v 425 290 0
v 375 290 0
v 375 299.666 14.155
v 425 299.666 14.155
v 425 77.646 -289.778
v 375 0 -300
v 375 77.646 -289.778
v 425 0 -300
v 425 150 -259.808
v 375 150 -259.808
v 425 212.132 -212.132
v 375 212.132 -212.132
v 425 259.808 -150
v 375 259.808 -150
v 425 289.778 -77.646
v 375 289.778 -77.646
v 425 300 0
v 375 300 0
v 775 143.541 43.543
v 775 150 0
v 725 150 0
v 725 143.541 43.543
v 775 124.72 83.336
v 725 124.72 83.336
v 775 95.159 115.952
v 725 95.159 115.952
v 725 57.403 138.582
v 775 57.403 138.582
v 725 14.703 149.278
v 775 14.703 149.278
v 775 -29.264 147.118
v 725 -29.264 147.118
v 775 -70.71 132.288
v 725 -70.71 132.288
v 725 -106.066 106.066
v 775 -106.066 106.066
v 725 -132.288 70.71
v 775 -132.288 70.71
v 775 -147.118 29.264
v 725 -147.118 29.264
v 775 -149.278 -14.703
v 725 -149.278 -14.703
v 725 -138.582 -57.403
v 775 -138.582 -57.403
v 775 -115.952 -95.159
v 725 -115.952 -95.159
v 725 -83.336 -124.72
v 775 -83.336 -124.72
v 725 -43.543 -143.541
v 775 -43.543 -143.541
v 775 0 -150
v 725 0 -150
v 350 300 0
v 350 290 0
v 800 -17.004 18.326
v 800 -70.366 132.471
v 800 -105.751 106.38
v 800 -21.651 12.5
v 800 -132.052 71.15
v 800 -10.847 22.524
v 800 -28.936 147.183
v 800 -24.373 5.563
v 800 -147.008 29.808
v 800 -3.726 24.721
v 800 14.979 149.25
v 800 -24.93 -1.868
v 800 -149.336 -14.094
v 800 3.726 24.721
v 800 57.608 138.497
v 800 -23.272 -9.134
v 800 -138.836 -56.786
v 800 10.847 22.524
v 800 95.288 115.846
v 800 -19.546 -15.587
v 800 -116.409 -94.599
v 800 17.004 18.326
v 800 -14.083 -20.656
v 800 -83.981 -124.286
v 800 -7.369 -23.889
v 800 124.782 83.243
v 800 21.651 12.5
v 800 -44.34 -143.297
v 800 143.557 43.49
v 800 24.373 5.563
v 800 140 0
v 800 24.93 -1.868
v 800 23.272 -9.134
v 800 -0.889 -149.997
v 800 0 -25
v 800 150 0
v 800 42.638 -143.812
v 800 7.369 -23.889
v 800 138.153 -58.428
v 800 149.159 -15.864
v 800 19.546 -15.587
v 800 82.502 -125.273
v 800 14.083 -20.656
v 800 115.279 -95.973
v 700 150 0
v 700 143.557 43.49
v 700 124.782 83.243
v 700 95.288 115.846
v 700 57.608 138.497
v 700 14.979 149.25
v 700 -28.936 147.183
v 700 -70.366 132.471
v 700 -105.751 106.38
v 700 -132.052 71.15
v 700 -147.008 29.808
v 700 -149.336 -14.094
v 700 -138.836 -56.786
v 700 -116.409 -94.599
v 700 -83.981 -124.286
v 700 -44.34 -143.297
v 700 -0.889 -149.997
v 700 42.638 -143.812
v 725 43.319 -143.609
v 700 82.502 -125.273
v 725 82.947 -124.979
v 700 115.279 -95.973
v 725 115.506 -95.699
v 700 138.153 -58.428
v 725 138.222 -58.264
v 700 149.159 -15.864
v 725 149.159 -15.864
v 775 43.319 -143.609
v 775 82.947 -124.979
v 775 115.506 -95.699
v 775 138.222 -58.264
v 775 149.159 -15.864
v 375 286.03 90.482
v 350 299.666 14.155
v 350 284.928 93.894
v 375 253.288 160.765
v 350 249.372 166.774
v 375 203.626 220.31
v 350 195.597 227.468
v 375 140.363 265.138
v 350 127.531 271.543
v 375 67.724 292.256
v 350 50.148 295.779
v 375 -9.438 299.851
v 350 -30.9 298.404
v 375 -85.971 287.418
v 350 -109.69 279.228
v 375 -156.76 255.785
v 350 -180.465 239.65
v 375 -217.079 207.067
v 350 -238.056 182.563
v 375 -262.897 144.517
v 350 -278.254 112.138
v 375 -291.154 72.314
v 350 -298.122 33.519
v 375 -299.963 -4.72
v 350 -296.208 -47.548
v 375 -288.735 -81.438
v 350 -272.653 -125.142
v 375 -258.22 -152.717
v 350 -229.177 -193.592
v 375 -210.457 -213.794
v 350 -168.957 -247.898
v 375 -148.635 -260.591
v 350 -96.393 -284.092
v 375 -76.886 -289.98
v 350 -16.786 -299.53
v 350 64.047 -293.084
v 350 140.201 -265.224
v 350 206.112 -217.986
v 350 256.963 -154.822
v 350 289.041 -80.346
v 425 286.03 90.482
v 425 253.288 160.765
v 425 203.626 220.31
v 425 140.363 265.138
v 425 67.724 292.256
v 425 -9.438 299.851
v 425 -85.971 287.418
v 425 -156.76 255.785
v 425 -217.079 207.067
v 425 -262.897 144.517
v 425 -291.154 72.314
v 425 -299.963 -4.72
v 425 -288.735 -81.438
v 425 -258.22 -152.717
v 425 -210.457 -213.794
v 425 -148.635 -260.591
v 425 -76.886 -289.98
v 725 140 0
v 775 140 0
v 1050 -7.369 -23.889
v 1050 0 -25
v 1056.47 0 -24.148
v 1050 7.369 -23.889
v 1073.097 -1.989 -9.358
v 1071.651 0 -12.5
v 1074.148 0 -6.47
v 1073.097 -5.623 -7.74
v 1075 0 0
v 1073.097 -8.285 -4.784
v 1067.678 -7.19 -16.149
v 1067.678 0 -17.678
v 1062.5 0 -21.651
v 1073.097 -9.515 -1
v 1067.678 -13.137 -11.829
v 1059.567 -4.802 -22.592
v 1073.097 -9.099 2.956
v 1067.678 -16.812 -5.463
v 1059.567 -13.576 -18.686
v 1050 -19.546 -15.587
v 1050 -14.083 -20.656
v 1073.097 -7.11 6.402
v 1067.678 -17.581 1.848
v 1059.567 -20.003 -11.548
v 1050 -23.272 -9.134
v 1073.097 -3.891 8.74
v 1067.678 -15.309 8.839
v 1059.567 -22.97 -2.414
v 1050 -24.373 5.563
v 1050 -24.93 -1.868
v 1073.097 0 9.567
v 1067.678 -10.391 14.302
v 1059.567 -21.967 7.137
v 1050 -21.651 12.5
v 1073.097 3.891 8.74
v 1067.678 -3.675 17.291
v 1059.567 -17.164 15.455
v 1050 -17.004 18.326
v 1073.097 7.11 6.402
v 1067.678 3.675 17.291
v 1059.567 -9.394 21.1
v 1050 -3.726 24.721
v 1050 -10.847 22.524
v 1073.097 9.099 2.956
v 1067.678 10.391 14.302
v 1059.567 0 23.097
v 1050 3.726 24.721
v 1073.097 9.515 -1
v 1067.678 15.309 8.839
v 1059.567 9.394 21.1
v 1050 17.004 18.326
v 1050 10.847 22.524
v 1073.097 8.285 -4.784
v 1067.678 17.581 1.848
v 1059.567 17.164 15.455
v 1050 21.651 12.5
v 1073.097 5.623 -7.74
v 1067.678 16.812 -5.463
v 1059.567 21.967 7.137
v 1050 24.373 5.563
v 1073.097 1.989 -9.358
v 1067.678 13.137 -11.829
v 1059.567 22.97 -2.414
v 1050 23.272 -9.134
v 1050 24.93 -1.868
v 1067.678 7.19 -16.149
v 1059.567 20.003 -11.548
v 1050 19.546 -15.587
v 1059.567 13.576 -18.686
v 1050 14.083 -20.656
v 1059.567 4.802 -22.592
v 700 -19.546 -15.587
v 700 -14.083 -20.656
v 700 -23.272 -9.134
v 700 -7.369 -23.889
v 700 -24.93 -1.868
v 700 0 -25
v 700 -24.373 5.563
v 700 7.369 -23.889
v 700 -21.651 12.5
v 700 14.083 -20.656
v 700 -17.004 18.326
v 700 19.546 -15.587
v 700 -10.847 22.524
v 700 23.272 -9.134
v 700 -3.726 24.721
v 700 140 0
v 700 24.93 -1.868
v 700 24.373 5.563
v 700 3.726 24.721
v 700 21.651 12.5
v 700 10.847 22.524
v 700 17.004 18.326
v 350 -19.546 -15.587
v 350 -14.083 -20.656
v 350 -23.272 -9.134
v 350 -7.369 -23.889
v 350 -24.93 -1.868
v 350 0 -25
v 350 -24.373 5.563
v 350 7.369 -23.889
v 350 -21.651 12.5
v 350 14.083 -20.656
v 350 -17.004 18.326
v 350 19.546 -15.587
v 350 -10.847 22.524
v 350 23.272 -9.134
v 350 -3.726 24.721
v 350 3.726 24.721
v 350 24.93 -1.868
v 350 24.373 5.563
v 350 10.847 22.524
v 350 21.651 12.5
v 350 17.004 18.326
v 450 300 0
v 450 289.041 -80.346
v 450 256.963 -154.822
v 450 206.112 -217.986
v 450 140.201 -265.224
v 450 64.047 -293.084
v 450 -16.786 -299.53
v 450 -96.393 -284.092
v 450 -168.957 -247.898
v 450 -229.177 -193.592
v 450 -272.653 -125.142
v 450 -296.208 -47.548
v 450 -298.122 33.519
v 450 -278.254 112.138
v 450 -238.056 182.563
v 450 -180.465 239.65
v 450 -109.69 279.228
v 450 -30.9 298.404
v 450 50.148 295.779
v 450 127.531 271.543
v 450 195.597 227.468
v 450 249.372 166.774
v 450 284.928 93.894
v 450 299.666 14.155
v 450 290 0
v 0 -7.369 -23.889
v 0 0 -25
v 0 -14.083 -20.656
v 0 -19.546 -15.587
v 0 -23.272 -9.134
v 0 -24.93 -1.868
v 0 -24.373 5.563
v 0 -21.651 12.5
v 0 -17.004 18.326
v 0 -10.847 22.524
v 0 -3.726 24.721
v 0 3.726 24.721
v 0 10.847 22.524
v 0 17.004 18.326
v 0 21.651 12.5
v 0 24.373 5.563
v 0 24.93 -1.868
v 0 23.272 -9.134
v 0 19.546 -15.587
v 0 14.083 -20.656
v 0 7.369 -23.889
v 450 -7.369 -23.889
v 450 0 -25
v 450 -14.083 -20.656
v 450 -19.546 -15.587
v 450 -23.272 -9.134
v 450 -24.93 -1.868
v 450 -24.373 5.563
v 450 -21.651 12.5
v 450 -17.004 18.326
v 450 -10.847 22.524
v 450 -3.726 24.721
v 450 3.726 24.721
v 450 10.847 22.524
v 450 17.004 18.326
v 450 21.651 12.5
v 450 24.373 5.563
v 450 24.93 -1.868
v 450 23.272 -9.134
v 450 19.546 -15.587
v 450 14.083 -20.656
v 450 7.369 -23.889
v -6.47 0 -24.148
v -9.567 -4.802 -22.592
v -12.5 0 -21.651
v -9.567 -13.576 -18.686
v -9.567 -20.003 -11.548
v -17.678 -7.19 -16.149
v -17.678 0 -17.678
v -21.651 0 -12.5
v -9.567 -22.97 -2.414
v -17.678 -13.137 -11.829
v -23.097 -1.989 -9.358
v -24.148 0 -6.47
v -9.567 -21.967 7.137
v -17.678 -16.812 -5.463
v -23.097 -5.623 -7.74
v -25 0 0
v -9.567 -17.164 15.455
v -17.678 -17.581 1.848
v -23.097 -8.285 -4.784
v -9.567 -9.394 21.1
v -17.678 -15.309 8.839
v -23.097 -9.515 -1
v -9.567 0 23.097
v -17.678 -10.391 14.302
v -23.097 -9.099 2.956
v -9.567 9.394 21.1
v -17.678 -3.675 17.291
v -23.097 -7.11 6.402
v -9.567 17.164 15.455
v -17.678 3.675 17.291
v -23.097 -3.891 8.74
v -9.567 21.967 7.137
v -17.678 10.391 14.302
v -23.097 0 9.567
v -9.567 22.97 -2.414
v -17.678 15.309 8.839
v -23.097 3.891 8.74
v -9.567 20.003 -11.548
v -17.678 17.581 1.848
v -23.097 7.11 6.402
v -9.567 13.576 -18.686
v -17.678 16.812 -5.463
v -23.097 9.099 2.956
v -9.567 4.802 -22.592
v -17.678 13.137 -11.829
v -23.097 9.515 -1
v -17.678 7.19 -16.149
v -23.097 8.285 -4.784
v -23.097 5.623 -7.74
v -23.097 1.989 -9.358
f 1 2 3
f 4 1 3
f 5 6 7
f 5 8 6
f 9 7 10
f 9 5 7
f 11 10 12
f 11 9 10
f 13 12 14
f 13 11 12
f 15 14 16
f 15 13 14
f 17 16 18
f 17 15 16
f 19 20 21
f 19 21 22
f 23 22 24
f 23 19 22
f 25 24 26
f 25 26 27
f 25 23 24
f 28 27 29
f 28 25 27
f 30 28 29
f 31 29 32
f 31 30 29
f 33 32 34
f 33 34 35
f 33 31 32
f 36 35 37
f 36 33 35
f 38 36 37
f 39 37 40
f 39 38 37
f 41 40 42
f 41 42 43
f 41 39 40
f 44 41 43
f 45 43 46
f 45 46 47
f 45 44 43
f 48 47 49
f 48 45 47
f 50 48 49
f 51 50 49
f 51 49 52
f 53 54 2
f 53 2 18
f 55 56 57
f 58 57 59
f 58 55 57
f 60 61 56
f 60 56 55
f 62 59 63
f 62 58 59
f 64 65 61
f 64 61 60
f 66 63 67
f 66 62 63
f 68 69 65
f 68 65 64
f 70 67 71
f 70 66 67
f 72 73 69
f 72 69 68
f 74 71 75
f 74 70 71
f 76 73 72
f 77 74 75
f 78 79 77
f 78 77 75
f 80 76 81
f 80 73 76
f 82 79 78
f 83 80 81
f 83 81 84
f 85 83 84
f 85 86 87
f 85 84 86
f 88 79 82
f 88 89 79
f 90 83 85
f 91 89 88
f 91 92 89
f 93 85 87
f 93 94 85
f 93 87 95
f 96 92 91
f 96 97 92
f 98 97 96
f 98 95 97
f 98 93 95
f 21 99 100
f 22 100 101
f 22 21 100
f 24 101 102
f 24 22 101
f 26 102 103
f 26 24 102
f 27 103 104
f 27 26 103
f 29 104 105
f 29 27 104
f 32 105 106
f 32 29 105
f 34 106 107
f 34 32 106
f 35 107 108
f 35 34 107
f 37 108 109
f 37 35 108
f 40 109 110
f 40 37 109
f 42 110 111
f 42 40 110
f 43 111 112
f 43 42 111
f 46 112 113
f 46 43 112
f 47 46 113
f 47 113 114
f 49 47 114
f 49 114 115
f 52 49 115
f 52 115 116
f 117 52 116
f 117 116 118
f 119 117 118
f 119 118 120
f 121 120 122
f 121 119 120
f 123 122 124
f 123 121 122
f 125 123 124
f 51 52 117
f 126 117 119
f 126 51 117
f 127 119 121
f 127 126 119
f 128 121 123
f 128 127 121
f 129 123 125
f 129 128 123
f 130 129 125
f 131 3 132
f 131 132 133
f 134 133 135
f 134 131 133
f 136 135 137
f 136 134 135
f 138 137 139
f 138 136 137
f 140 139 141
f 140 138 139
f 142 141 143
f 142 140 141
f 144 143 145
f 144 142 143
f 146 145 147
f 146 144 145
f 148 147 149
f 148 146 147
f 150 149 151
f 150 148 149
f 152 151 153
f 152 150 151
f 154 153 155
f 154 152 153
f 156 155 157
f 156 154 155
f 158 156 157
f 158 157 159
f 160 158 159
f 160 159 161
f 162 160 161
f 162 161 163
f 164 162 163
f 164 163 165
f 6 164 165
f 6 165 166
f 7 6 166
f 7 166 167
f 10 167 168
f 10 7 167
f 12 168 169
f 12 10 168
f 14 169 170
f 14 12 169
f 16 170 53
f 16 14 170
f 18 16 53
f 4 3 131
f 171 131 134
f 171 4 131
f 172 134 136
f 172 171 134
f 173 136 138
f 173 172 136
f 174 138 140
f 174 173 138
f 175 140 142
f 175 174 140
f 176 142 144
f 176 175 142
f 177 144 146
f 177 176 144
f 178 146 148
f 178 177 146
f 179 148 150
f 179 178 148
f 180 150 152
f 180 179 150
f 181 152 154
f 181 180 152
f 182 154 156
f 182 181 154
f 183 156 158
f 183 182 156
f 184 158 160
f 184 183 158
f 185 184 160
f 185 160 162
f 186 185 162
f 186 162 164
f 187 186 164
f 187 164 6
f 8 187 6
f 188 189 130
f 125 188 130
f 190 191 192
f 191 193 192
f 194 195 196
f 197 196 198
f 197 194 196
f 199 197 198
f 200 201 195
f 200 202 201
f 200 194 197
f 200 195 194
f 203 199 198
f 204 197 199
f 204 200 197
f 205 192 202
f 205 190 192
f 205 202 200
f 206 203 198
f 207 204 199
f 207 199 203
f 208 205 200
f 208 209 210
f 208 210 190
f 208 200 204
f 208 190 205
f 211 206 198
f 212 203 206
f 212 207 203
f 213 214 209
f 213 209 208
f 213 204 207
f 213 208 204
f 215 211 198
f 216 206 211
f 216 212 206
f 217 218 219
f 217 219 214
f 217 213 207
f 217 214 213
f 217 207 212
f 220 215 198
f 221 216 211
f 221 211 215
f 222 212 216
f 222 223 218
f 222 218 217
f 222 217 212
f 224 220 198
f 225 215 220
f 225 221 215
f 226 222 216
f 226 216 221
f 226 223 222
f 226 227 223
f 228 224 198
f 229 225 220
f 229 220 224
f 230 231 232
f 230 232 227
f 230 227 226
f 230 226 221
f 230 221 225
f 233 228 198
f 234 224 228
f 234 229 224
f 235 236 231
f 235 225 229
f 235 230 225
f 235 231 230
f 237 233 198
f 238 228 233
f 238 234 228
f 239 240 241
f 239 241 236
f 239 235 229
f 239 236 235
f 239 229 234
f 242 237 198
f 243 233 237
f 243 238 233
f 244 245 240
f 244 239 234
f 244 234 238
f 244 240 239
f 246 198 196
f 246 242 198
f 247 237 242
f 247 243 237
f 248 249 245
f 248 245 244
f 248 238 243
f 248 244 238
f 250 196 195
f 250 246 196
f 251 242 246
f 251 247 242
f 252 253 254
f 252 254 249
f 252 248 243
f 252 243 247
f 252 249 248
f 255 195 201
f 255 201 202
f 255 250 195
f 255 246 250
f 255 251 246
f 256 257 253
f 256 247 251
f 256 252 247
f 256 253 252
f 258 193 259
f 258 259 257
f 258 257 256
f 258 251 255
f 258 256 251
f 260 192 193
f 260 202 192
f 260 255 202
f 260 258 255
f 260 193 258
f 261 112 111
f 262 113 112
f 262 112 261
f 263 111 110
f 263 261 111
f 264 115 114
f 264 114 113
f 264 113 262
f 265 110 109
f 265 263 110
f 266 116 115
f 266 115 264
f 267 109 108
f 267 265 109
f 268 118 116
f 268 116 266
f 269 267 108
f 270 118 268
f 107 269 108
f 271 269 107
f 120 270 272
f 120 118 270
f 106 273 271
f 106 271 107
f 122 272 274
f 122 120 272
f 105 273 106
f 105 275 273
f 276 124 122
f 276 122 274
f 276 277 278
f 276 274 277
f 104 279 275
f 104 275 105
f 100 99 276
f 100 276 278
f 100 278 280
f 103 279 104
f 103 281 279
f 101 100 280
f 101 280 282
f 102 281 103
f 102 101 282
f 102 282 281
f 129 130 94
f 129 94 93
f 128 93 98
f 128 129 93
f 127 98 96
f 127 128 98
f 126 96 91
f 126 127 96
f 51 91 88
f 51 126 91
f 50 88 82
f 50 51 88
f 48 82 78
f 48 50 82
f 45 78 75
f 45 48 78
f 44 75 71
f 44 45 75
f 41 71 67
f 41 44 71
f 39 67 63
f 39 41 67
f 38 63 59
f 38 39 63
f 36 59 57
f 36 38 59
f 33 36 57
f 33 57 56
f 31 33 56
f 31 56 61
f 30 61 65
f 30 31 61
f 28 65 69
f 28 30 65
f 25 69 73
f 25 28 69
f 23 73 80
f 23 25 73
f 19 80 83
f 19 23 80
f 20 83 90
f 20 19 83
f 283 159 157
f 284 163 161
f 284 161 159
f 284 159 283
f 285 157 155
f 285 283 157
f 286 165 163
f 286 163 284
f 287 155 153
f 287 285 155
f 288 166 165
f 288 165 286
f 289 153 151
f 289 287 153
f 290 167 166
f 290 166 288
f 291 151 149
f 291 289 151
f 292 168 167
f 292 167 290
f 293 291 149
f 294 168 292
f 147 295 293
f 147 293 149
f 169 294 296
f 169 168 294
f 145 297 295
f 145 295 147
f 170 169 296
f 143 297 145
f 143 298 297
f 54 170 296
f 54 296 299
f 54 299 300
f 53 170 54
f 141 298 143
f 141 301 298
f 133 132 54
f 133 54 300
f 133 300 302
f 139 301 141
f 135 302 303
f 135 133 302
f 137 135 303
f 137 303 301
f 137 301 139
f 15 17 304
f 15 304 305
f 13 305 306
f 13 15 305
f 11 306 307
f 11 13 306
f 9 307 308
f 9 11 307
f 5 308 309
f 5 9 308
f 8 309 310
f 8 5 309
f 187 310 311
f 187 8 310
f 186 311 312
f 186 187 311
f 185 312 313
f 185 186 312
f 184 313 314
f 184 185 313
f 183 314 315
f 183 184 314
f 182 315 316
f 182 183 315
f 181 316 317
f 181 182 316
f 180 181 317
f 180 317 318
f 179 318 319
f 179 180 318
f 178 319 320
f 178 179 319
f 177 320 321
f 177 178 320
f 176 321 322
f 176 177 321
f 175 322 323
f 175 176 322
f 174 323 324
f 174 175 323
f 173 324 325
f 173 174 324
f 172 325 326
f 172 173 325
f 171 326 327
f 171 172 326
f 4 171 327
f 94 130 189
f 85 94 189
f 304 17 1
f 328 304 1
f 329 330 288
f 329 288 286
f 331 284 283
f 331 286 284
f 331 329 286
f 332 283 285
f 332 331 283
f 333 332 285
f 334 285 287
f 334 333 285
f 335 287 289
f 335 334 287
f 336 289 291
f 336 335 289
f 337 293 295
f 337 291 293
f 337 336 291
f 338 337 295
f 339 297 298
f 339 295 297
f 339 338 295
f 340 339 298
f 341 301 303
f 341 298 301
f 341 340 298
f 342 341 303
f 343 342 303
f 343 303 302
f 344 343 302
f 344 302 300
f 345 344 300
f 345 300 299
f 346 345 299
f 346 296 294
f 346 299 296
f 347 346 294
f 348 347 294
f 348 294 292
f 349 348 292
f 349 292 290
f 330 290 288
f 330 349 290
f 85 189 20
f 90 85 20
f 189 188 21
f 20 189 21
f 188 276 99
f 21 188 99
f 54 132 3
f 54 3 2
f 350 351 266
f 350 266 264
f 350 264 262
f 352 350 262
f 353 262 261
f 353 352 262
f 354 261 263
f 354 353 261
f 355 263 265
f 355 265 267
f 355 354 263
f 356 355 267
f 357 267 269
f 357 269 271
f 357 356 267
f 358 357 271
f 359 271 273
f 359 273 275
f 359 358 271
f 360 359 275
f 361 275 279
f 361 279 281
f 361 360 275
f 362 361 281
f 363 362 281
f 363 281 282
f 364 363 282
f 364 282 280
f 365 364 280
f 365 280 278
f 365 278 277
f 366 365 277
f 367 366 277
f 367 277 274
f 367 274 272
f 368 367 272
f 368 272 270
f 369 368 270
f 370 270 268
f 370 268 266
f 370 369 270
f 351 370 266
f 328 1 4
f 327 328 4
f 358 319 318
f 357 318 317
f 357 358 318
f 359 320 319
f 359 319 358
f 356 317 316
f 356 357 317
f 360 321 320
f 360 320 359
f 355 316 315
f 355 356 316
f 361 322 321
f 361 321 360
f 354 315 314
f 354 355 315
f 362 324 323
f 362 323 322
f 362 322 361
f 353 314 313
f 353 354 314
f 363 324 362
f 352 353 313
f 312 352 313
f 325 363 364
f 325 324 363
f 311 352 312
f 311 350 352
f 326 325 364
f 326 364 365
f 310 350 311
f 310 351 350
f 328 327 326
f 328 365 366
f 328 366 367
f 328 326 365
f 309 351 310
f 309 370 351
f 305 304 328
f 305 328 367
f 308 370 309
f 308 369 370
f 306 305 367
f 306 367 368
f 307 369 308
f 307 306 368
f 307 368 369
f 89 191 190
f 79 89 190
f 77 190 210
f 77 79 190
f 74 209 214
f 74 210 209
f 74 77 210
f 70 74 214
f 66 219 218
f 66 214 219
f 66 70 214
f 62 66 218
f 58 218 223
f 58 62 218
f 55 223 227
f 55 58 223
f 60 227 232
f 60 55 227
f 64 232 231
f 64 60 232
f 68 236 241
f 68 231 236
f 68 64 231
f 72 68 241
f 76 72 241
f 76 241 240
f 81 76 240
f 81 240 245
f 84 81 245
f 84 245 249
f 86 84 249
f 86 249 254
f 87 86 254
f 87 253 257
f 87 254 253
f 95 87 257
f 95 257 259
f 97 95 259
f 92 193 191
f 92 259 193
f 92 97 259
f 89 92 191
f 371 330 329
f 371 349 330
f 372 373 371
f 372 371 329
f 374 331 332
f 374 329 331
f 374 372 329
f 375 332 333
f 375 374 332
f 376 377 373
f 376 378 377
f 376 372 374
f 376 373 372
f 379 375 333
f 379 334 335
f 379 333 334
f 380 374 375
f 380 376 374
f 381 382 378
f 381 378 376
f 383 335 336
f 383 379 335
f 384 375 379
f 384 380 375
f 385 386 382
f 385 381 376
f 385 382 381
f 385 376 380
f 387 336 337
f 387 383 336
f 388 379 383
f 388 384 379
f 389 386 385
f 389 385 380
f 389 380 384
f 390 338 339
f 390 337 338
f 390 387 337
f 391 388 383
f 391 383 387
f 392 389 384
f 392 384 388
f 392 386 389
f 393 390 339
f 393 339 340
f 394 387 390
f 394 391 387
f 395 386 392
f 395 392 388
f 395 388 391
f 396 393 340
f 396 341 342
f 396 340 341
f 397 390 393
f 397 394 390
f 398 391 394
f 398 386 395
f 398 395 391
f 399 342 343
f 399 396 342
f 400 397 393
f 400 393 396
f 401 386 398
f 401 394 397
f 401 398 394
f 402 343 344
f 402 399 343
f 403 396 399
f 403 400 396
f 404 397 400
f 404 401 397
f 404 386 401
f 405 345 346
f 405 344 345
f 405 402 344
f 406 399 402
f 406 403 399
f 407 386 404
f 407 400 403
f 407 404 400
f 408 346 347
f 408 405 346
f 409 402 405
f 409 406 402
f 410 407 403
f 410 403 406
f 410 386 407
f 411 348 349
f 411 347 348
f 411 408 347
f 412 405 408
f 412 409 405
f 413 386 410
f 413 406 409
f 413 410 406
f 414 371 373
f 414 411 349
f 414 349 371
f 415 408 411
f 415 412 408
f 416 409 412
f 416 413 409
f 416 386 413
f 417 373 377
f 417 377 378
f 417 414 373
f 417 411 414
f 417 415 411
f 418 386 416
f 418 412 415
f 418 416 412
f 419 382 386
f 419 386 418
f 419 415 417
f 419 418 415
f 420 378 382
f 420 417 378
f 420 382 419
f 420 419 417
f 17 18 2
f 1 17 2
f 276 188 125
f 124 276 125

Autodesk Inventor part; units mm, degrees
ref_plane "YZ Plane" through (0, 0, 0) normal (1, 0, 0) x (0, 1, 0)
ref_plane "XZ Plane" through (0, 0, 0) normal (0, 1, 0) x (-1, 0, 0)
ref_plane "XY Plane" through (0, 0, 0) normal (0, 0, 1) x (1, 0, 0)
sketch "Sketch1" plane through (0, 0, 0) normal (0, 1, 0) x (-1, 0, 0)
  line L0 (0, 0) -> (-400, 0) construction
  line L1 (-400, 0) -> (-750, 0)
  line L2 (-750, 0) -> (-1050, 0)
  line L3 (-400, 0) -> (-400, -300) construction
  line L4 (-400, -300) -> (-375, -300) construction
  line L5 (-375, -300) -> (-425, -300)
  line L6 (-425, -300) -> (-425, 0)
  line L7 (-425, 0) -> (-375, 0)
  line L8 (-375, 0) -> (-375, -300)
  line L9 (0, 0) -> (-1050, 0)
  line L10 (-1050, 0) -> (-1050, -25)
  line L11 (-1050, -25) -> (0, -25)
  line L12 (0, -25) -> (0, 0)
  arc A0 (0, -25) -> (25, 0) centre (0, 0) ccw
  line L13 (0, 0) -> (25, 0) construction
  line L14 (-750, 0) -> (-750, -150) construction
  line L15 (-750, -150) -> (-725, -150) construction
  line L16 (-725, -150) -> (-775, -150)
  line L17 (-775, -150) -> (-775, 0)
  line L18 (-775, 0) -> (-725, 0)
  line L19 (-725, 0) -> (-725, -150)
  arc A1 (-1075, 0) -> (-1050, -25) centre (-1050, 0) ccw
  line L20 (-1050, 0) -> (-1075, 0)
  line L21 (25, 0) -> (0, 0)
  point P0 (-775, -25)
  point P1 (-725, -25)
  point P2 (-425, -25)
  point P3 (-375, -25)
  dimension "d0" = 400
  dimension "d1" = 350
  dimension "d2" = 300
  dimension "d3" = 300
  dimension "d4" = 25
  dimension "d5" = 50
  dimension "d6" = 1050
  dimension "d7" = 25
  dimension "d8" = 150
  dimension "d9" = 25
  dimension "d10" = 50
revolve "Revolution1" add sketch "Sketch1" angle 360 about axis through (0, 0, 0) along (1, 0, 0)
sketch "Sketch2" plane through (375, 0, 0) normal (-1, 0, 0) x (0, 0, 1)
  circle A0 centre (0, 0) radius 300 projected
  line L0 (0, 300) -> (0, 290)
  line L1 (0, 290) -> (25.5833, 307.4702)
  point P0 (14.1547, 299.6659)
  dimension "d12" = 10
extrude "Extrusion1" cut sketch "Sketch2" against normal blind 284.25 contours A0 L1 L0 picked at (7.8644, 296.5058)
sketch "Sketch3" plane through (775, 0, 0) normal (1, 0, 0) x (0, 0, -1)
  circle A0 centre (0, 0) radius 150 projected
  line L0 (0, 150) -> (0, 140)
  line L1 (0, 140) -> (62.4254, 176.0413)
  point P0 (15.8635, 149.1588)
  dimension "d15" = 10
  dimension "d16" = 60
extrude "Extrusion2" cut sketch "Sketch3" against normal blind 139 contours A0 L1 L0 picked at (8.8167, 146.2616)
sketch "Sketch4" plane through (375, 0, 0) normal (-1, 0, 0) x (0, -0.0235977, 0.9997215)
  line L0 (7.0793, 299.9165) -> (-6.8433, 289.9192) projected
  line L1 (-6.8433, 289.9192) -> (-7.0793, 299.9165) projected
  arc A0 (-7.0793, 299.9165) -> (7.0793, 299.9165) centre (0, 0) ccw projected
  circle A1 centre (0, 0) radius 25 projected
sketch "Sketch5" plane through (425, 0, 0) normal (1, 0, 0) x (0, 0.0235977, -0.9997215)
  line L0 (6.8433, 289.9192) -> (-7.0793, 299.9165) projected
  arc A0 (-7.0793, 299.9165) -> (7.0793, 299.9165) centre (0, 0) ccw projected
  line L1 (7.0793, 299.9165) -> (6.8433, 289.9192) projected
  circle A1 centre (0, 0) radius 25 projected
sketch "Sketch6" plane through (725, 140, 0) normal (-1, 0, 0) x (0, 0, 1)
  line L0 (0, 0) -> (-15.8635, 9.1588) projected
  arc A0 (-15.8635, 9.1588) -> (0, 10) centre (0, -140) ccw projected
  line L1 (0, 10) -> (0, 0) projected
  circle A1 centre (0, -140) radius 25 projected
sketch "Sketch7" plane through (775, 140, 0) normal (1, 0, 0) x (0, 0, -1)
  circle A0 centre (0, -140) radius 25 projected
  line L0 (15.8635, 9.1588) -> (0, 0) projected
  line L1 (0, 0) -> (0, 10) projected
  arc A1 (0, 10) -> (15.8635, 9.1588) centre (0, -140) ccw projected
extrude "Extrusion3" add sketch "Sketch6" along normal blind 25 contours L1 A0 L0 | A1
extrude "Extrusion4" add sketch "Sketch7" along normal blind 25
extrude "Extrusion5" add sketch "Sketch5" along normal blind 25
extrude "Extrusion6" add sketch "Sketch4" along normal blind 25
properties part number "shaft_model_10cm" material "Steel"
